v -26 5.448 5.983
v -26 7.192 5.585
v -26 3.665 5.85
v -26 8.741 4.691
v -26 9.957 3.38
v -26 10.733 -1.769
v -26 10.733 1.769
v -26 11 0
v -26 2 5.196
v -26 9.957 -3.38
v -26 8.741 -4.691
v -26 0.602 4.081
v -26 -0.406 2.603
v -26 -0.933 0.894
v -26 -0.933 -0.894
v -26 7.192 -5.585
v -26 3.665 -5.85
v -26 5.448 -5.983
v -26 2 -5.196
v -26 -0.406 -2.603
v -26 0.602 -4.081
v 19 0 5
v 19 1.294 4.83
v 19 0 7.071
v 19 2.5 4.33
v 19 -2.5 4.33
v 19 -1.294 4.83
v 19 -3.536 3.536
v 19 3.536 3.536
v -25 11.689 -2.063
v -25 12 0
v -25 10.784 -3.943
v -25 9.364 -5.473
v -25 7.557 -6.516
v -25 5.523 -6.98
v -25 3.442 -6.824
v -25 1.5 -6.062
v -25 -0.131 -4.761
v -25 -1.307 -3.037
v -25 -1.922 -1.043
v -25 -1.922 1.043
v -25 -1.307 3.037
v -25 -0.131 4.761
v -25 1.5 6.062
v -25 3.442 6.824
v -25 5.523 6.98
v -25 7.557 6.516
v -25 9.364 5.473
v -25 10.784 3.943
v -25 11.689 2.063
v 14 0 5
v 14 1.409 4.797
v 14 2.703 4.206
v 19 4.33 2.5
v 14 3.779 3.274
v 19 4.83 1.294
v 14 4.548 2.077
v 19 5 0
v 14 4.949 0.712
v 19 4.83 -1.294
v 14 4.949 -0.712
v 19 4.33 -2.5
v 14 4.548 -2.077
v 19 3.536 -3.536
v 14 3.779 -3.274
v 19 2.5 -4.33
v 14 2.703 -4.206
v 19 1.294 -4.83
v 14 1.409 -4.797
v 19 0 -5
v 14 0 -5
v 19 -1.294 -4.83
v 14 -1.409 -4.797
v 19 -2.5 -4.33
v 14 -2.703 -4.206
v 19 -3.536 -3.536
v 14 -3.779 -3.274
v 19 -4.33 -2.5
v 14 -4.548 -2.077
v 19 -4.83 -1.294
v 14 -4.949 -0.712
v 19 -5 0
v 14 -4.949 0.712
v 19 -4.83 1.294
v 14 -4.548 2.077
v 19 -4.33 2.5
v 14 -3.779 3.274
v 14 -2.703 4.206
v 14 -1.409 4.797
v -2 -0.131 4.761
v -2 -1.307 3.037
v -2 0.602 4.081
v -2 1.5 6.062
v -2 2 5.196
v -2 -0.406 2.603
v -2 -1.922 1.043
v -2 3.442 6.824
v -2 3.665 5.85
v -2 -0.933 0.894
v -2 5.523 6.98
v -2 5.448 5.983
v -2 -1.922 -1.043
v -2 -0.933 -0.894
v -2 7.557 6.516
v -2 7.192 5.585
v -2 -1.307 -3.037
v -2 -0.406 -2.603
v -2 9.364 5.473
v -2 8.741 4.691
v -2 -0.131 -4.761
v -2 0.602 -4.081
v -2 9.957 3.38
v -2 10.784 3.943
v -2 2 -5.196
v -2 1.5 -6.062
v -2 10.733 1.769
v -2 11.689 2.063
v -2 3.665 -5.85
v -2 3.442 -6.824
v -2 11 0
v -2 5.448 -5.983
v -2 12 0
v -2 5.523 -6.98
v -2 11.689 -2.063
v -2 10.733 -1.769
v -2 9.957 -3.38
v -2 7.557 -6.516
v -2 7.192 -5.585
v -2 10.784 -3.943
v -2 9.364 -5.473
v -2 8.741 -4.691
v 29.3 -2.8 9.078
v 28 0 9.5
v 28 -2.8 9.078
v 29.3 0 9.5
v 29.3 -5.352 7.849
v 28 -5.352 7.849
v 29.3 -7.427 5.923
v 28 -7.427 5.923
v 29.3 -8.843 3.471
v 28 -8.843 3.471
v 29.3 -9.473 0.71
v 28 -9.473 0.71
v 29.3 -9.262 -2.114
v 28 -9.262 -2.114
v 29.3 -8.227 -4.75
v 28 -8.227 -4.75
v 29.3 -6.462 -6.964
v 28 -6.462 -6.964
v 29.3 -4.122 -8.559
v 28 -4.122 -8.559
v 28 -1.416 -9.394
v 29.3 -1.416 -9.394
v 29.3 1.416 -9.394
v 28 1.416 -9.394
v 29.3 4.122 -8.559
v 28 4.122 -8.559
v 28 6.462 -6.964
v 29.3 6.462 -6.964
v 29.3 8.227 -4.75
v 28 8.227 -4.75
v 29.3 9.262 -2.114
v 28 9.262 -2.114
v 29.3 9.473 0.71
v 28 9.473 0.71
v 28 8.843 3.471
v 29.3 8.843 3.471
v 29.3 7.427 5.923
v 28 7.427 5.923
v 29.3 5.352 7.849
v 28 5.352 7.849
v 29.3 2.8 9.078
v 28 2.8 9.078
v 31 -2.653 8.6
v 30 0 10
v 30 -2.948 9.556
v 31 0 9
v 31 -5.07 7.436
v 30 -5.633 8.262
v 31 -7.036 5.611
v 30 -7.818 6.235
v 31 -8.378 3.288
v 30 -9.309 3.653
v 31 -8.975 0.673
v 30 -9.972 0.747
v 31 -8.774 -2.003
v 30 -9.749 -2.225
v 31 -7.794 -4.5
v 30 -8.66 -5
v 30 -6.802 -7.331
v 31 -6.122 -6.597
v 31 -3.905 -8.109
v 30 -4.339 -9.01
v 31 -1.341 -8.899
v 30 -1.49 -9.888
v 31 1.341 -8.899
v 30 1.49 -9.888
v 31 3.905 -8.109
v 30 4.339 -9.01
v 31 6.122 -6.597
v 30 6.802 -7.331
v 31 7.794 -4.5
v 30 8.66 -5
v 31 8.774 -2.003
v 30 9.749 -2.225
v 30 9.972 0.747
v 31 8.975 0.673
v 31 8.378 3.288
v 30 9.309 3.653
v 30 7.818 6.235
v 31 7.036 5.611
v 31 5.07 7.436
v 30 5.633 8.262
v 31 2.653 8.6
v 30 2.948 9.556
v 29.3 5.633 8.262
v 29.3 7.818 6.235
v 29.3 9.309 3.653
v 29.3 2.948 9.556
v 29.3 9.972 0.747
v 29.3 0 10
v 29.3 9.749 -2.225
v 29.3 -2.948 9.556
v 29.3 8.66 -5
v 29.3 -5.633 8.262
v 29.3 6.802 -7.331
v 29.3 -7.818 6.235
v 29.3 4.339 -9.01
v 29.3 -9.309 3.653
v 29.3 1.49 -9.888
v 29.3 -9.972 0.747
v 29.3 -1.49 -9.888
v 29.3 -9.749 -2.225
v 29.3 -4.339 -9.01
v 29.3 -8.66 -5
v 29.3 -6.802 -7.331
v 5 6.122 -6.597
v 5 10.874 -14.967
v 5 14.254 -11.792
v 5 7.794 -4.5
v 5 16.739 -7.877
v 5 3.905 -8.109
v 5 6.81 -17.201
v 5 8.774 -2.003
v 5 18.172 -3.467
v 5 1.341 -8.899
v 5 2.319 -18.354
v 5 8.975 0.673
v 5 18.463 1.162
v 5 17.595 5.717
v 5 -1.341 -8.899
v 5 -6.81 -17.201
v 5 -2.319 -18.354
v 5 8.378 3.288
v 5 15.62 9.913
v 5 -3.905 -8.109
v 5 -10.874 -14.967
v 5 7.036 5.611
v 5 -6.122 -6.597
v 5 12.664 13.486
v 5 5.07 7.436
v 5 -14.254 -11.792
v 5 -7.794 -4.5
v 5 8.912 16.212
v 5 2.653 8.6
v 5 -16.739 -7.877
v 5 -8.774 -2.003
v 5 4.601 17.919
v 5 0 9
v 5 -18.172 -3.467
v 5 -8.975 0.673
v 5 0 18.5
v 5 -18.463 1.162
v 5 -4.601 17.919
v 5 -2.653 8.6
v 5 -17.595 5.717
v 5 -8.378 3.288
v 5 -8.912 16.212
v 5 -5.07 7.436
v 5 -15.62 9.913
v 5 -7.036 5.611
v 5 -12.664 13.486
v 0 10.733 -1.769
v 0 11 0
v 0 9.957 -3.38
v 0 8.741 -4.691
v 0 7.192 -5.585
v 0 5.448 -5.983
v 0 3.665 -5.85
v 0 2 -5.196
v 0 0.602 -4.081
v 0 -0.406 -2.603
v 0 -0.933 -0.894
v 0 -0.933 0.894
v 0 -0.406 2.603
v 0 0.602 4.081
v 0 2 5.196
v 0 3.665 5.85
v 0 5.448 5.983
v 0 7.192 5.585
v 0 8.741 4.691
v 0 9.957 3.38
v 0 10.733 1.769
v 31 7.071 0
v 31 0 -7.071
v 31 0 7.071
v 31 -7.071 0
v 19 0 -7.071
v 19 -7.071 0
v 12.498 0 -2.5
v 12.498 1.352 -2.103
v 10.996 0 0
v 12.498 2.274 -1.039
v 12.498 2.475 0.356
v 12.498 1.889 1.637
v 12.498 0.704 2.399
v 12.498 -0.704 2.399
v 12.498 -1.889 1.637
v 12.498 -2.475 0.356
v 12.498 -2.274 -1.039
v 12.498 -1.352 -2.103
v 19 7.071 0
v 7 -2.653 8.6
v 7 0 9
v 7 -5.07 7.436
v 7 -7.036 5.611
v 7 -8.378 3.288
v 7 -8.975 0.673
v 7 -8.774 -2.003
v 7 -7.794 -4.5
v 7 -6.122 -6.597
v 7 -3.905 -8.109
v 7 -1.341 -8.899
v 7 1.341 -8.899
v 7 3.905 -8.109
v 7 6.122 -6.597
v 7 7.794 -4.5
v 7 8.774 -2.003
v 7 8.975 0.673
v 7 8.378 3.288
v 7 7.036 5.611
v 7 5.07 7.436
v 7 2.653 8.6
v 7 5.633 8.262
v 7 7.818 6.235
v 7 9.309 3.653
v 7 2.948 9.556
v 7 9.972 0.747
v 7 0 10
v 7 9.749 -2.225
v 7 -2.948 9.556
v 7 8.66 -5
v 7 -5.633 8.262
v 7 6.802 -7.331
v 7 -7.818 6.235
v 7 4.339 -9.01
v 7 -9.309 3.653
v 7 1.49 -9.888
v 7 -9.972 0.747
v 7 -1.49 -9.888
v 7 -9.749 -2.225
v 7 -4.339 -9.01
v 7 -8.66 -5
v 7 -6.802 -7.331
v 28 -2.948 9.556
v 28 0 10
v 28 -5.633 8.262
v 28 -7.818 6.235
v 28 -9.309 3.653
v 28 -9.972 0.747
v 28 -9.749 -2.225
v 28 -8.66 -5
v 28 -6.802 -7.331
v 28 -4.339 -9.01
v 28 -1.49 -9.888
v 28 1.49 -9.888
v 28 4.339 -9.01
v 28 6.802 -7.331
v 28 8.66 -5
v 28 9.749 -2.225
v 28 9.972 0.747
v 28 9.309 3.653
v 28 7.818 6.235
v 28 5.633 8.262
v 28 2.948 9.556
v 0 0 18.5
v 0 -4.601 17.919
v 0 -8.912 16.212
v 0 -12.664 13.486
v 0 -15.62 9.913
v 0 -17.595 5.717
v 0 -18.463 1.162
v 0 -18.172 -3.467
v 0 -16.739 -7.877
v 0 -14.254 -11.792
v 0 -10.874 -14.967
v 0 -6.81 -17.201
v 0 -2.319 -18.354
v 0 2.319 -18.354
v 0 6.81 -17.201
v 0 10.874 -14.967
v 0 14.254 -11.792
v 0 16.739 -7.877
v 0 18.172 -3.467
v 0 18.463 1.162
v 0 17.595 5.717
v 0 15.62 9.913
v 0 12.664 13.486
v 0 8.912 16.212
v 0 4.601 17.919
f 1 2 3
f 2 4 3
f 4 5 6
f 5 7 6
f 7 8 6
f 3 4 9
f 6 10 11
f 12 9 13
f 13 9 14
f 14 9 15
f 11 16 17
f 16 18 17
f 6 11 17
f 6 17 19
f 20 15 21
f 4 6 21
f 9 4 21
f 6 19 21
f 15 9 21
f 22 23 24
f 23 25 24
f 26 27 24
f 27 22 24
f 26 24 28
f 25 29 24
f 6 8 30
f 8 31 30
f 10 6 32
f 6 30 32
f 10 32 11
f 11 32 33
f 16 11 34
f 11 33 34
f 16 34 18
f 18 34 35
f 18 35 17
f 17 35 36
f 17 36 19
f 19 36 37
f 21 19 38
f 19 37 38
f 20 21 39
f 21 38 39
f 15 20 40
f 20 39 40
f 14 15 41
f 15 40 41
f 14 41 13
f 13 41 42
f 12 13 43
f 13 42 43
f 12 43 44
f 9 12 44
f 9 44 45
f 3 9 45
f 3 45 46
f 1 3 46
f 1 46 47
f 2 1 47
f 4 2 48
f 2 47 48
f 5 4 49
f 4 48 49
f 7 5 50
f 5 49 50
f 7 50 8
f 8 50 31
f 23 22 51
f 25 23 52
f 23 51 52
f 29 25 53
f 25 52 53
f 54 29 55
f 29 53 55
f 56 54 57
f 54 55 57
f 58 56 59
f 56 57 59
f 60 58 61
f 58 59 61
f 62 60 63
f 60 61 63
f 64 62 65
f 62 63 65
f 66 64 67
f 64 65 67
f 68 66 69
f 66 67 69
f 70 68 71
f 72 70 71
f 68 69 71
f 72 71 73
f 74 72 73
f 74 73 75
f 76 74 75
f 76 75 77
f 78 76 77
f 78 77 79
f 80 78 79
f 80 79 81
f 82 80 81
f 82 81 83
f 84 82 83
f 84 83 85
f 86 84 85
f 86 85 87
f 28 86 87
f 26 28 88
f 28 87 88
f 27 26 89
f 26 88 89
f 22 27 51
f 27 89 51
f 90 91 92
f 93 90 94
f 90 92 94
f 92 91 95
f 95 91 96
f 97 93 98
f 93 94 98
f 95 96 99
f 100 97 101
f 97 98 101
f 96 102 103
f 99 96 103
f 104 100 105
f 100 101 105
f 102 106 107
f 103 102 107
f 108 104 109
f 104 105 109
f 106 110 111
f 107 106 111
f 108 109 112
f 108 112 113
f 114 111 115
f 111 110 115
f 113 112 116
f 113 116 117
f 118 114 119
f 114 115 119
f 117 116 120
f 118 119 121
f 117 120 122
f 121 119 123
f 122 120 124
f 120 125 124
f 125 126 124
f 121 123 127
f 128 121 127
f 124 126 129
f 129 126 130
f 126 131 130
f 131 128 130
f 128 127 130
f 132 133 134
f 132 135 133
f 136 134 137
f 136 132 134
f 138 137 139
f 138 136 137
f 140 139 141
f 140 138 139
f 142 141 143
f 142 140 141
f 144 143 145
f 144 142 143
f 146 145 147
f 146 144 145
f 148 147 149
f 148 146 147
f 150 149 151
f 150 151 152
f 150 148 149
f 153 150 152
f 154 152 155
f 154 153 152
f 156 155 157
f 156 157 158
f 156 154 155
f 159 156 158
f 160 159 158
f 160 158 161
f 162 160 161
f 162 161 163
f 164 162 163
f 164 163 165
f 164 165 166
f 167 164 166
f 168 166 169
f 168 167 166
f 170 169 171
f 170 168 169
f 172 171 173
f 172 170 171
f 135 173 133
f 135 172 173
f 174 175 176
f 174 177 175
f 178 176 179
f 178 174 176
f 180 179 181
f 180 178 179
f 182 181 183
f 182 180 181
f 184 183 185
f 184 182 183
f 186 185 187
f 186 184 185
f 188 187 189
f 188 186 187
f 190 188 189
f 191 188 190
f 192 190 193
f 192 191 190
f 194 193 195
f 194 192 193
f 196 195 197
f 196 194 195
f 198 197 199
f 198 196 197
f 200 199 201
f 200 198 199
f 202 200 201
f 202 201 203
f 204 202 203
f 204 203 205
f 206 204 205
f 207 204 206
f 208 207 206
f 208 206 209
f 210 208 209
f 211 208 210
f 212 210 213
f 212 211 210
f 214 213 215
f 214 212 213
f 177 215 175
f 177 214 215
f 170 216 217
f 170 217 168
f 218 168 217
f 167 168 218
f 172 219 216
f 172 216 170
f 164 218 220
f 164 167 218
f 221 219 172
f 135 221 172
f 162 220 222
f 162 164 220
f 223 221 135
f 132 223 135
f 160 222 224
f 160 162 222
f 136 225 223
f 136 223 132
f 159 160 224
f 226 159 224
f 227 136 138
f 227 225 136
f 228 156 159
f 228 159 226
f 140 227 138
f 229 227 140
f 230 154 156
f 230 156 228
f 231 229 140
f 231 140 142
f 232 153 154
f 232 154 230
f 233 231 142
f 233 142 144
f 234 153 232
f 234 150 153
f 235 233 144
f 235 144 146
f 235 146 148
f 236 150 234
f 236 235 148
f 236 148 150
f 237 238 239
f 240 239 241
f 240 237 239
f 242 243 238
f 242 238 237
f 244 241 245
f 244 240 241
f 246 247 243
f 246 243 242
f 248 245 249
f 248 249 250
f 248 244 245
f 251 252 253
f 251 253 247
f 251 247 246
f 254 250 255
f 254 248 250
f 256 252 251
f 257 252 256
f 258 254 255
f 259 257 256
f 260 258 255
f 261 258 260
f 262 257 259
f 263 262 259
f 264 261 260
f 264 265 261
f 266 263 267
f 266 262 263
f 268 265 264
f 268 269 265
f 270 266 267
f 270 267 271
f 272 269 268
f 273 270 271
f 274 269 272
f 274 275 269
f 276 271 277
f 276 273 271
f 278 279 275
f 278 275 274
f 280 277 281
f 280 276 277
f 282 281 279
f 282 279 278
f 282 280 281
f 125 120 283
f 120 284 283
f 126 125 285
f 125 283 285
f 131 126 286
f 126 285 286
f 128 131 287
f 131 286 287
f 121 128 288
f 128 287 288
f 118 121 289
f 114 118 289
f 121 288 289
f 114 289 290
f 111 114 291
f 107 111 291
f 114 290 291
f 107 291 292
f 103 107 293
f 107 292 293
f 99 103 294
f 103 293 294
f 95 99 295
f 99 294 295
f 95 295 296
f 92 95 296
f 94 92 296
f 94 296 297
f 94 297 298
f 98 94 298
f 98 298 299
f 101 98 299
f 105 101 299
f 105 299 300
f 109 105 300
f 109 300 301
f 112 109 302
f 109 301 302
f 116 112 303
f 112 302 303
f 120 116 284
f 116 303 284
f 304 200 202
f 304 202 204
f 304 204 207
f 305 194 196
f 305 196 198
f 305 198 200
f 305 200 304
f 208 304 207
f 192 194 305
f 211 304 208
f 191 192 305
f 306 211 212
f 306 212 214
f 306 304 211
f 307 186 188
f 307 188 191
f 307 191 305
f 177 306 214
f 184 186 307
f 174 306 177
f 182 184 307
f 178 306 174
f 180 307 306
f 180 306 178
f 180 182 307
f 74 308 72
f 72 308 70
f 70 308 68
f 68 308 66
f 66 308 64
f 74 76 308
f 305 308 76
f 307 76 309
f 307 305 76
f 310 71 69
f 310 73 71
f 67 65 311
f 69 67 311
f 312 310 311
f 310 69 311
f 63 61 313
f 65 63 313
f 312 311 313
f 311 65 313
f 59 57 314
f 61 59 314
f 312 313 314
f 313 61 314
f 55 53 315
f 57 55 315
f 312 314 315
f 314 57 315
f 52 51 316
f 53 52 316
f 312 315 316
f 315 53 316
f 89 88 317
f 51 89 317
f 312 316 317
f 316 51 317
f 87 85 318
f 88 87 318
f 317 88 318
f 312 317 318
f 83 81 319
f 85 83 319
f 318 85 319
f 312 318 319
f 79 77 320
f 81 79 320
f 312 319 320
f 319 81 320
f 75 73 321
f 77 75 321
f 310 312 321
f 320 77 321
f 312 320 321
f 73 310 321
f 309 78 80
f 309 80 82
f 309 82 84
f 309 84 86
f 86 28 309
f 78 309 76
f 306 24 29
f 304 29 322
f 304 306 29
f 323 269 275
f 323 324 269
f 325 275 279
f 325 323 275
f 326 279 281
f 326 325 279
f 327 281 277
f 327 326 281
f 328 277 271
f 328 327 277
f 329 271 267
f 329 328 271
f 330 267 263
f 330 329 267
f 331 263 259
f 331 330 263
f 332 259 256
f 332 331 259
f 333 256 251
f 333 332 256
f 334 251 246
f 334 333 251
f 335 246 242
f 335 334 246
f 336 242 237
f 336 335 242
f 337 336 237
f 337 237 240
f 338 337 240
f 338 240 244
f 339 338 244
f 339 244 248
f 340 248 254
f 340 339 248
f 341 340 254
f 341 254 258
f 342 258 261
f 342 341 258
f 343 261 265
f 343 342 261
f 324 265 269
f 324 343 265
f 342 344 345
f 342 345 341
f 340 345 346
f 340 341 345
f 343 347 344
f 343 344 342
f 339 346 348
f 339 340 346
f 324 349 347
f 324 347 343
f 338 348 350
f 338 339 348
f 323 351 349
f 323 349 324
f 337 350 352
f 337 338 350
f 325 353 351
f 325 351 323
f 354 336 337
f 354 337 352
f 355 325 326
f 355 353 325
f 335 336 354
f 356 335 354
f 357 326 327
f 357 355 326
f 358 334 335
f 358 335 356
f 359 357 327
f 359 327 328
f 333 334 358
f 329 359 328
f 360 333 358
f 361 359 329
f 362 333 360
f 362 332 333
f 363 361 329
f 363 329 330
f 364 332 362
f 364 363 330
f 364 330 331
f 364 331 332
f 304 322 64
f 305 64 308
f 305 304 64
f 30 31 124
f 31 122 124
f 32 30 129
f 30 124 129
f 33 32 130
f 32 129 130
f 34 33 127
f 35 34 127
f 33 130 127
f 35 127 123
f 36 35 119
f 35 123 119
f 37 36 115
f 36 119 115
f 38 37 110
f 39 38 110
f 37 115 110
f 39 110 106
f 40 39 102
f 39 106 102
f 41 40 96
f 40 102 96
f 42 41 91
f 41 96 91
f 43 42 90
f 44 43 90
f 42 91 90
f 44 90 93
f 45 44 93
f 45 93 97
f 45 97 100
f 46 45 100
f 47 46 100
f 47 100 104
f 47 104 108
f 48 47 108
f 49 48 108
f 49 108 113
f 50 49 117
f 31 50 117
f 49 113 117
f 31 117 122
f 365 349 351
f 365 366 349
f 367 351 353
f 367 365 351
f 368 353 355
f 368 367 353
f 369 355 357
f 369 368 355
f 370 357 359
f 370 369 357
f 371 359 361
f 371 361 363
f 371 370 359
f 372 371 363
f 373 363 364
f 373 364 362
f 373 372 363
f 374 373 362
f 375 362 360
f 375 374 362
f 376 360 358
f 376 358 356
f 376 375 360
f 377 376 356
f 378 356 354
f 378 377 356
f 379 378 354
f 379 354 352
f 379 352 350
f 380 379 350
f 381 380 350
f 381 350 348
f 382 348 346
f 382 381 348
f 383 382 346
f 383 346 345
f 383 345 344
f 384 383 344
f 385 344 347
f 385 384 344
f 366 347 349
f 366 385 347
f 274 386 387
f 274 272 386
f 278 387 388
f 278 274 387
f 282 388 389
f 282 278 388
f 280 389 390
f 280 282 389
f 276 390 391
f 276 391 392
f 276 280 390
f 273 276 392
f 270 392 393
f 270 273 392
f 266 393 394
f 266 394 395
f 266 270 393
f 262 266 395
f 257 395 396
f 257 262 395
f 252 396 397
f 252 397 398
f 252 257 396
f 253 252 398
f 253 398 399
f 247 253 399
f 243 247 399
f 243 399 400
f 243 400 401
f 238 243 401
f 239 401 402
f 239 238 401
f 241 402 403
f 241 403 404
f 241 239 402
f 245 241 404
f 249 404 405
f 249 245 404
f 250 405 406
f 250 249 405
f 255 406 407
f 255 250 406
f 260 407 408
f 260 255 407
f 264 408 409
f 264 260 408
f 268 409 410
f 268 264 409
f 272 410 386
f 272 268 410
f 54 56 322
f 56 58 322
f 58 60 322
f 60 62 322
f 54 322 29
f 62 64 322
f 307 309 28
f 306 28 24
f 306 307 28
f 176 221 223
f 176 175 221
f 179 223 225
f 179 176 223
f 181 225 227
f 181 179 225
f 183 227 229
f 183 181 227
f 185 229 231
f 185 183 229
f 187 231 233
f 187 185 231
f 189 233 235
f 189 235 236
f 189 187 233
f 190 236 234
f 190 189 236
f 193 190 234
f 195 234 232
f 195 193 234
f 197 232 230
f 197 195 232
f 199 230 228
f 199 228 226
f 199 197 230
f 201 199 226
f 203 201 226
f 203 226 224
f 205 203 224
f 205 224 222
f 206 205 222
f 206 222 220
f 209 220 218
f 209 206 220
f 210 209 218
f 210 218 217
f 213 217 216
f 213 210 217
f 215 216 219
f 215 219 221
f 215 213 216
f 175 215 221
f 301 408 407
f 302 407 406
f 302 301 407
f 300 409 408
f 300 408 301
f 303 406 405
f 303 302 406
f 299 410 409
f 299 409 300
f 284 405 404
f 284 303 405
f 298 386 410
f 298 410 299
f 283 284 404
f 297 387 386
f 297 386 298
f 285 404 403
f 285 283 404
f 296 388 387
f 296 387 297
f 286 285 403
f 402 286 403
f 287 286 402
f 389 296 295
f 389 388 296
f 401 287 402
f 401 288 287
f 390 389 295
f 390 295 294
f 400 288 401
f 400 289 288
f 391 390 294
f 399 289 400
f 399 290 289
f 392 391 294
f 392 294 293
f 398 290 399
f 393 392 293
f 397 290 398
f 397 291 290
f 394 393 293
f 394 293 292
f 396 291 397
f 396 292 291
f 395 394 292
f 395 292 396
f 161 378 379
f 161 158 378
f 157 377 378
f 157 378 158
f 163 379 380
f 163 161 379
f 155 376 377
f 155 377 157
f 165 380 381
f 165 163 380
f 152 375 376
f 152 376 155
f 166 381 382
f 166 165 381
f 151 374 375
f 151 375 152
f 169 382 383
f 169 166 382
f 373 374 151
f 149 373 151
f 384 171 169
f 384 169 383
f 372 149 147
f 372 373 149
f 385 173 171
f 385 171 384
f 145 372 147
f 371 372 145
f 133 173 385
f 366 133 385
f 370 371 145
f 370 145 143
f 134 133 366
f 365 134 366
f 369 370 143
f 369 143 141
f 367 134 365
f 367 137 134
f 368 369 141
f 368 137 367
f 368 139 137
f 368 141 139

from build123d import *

# Parameters (mm, degrees)
PER_AGE5_D              = 10
PER_AGE5_DEPTH          = 17
PER_AGE5_TIP            = 3.004303095
ENL_V_MAT_EXTRU_1_DEPTH = 12


with BuildPart() as part:
    # Esquisse1 → Base-Révolution (revolve)
    with BuildSketch(Plane.XY, mode=Mode.PRIVATE) as base_r_volution_sk:
        Polygon((0, 0), (0, 18.5), (5, 18.5), (5, 9), (7, 9), (7, 10), (28, 10), (28, 9.5), (29.3, 9.5), (29.3, 10), (30, 10), (31, 9), (31, 0), align=None)
    revolve(base_r_volution_sk.sketch.rotate(Axis((0, 0, 0), (1, 0, 0)), 90), axis=Axis((0, 0, 0), (1, 0, 0)))

    # Esquisse2 → Boss.-Révol.1 (revolve)
    with BuildSketch(Plane.XY):
        Polygon((-26, 5), (-26, 11), (-25, 12), (-2, 12), (-2, 11), (0, 11), (0, 5), align=None)
    revolve(axis=Axis((0, 5, 0), (-1, 0, 0)))

    # Perçage5
    with Locations(Plane(origin=(31, 0, 0), x_dir=(0, 0, -1), z_dir=(1, 0, 0))):
        with Locations((0, 0)):
            Hole(PER_AGE5_D / 2, depth=PER_AGE5_DEPTH)
            with Locations((0, 0, -(PER_AGE5_DEPTH + PER_AGE5_TIP / 2))):  # 118° drill point
                Cone(0, PER_AGE5_D / 2, PER_AGE5_TIP, mode=Mode.SUBTRACT)

    # Esquisse5 → Enlèv. mat.-Extru.1 (cut)
    with BuildSketch(Plane(origin=(31, 0.918663762, 3.195352215), x_dir=(0, 0, -1), z_dir=(1, 0, 0))):
        Polygon((-3.875715597, -0.918663762), (3.195352215, 6.15240405), (10.266420027, -0.918663762), (3.195352215, -7.989731574), align=None)
    extrude(amount=-ENL_V_MAT_EXTRU_1_DEPTH, mode=Mode.SUBTRACT)


solid = part.part
